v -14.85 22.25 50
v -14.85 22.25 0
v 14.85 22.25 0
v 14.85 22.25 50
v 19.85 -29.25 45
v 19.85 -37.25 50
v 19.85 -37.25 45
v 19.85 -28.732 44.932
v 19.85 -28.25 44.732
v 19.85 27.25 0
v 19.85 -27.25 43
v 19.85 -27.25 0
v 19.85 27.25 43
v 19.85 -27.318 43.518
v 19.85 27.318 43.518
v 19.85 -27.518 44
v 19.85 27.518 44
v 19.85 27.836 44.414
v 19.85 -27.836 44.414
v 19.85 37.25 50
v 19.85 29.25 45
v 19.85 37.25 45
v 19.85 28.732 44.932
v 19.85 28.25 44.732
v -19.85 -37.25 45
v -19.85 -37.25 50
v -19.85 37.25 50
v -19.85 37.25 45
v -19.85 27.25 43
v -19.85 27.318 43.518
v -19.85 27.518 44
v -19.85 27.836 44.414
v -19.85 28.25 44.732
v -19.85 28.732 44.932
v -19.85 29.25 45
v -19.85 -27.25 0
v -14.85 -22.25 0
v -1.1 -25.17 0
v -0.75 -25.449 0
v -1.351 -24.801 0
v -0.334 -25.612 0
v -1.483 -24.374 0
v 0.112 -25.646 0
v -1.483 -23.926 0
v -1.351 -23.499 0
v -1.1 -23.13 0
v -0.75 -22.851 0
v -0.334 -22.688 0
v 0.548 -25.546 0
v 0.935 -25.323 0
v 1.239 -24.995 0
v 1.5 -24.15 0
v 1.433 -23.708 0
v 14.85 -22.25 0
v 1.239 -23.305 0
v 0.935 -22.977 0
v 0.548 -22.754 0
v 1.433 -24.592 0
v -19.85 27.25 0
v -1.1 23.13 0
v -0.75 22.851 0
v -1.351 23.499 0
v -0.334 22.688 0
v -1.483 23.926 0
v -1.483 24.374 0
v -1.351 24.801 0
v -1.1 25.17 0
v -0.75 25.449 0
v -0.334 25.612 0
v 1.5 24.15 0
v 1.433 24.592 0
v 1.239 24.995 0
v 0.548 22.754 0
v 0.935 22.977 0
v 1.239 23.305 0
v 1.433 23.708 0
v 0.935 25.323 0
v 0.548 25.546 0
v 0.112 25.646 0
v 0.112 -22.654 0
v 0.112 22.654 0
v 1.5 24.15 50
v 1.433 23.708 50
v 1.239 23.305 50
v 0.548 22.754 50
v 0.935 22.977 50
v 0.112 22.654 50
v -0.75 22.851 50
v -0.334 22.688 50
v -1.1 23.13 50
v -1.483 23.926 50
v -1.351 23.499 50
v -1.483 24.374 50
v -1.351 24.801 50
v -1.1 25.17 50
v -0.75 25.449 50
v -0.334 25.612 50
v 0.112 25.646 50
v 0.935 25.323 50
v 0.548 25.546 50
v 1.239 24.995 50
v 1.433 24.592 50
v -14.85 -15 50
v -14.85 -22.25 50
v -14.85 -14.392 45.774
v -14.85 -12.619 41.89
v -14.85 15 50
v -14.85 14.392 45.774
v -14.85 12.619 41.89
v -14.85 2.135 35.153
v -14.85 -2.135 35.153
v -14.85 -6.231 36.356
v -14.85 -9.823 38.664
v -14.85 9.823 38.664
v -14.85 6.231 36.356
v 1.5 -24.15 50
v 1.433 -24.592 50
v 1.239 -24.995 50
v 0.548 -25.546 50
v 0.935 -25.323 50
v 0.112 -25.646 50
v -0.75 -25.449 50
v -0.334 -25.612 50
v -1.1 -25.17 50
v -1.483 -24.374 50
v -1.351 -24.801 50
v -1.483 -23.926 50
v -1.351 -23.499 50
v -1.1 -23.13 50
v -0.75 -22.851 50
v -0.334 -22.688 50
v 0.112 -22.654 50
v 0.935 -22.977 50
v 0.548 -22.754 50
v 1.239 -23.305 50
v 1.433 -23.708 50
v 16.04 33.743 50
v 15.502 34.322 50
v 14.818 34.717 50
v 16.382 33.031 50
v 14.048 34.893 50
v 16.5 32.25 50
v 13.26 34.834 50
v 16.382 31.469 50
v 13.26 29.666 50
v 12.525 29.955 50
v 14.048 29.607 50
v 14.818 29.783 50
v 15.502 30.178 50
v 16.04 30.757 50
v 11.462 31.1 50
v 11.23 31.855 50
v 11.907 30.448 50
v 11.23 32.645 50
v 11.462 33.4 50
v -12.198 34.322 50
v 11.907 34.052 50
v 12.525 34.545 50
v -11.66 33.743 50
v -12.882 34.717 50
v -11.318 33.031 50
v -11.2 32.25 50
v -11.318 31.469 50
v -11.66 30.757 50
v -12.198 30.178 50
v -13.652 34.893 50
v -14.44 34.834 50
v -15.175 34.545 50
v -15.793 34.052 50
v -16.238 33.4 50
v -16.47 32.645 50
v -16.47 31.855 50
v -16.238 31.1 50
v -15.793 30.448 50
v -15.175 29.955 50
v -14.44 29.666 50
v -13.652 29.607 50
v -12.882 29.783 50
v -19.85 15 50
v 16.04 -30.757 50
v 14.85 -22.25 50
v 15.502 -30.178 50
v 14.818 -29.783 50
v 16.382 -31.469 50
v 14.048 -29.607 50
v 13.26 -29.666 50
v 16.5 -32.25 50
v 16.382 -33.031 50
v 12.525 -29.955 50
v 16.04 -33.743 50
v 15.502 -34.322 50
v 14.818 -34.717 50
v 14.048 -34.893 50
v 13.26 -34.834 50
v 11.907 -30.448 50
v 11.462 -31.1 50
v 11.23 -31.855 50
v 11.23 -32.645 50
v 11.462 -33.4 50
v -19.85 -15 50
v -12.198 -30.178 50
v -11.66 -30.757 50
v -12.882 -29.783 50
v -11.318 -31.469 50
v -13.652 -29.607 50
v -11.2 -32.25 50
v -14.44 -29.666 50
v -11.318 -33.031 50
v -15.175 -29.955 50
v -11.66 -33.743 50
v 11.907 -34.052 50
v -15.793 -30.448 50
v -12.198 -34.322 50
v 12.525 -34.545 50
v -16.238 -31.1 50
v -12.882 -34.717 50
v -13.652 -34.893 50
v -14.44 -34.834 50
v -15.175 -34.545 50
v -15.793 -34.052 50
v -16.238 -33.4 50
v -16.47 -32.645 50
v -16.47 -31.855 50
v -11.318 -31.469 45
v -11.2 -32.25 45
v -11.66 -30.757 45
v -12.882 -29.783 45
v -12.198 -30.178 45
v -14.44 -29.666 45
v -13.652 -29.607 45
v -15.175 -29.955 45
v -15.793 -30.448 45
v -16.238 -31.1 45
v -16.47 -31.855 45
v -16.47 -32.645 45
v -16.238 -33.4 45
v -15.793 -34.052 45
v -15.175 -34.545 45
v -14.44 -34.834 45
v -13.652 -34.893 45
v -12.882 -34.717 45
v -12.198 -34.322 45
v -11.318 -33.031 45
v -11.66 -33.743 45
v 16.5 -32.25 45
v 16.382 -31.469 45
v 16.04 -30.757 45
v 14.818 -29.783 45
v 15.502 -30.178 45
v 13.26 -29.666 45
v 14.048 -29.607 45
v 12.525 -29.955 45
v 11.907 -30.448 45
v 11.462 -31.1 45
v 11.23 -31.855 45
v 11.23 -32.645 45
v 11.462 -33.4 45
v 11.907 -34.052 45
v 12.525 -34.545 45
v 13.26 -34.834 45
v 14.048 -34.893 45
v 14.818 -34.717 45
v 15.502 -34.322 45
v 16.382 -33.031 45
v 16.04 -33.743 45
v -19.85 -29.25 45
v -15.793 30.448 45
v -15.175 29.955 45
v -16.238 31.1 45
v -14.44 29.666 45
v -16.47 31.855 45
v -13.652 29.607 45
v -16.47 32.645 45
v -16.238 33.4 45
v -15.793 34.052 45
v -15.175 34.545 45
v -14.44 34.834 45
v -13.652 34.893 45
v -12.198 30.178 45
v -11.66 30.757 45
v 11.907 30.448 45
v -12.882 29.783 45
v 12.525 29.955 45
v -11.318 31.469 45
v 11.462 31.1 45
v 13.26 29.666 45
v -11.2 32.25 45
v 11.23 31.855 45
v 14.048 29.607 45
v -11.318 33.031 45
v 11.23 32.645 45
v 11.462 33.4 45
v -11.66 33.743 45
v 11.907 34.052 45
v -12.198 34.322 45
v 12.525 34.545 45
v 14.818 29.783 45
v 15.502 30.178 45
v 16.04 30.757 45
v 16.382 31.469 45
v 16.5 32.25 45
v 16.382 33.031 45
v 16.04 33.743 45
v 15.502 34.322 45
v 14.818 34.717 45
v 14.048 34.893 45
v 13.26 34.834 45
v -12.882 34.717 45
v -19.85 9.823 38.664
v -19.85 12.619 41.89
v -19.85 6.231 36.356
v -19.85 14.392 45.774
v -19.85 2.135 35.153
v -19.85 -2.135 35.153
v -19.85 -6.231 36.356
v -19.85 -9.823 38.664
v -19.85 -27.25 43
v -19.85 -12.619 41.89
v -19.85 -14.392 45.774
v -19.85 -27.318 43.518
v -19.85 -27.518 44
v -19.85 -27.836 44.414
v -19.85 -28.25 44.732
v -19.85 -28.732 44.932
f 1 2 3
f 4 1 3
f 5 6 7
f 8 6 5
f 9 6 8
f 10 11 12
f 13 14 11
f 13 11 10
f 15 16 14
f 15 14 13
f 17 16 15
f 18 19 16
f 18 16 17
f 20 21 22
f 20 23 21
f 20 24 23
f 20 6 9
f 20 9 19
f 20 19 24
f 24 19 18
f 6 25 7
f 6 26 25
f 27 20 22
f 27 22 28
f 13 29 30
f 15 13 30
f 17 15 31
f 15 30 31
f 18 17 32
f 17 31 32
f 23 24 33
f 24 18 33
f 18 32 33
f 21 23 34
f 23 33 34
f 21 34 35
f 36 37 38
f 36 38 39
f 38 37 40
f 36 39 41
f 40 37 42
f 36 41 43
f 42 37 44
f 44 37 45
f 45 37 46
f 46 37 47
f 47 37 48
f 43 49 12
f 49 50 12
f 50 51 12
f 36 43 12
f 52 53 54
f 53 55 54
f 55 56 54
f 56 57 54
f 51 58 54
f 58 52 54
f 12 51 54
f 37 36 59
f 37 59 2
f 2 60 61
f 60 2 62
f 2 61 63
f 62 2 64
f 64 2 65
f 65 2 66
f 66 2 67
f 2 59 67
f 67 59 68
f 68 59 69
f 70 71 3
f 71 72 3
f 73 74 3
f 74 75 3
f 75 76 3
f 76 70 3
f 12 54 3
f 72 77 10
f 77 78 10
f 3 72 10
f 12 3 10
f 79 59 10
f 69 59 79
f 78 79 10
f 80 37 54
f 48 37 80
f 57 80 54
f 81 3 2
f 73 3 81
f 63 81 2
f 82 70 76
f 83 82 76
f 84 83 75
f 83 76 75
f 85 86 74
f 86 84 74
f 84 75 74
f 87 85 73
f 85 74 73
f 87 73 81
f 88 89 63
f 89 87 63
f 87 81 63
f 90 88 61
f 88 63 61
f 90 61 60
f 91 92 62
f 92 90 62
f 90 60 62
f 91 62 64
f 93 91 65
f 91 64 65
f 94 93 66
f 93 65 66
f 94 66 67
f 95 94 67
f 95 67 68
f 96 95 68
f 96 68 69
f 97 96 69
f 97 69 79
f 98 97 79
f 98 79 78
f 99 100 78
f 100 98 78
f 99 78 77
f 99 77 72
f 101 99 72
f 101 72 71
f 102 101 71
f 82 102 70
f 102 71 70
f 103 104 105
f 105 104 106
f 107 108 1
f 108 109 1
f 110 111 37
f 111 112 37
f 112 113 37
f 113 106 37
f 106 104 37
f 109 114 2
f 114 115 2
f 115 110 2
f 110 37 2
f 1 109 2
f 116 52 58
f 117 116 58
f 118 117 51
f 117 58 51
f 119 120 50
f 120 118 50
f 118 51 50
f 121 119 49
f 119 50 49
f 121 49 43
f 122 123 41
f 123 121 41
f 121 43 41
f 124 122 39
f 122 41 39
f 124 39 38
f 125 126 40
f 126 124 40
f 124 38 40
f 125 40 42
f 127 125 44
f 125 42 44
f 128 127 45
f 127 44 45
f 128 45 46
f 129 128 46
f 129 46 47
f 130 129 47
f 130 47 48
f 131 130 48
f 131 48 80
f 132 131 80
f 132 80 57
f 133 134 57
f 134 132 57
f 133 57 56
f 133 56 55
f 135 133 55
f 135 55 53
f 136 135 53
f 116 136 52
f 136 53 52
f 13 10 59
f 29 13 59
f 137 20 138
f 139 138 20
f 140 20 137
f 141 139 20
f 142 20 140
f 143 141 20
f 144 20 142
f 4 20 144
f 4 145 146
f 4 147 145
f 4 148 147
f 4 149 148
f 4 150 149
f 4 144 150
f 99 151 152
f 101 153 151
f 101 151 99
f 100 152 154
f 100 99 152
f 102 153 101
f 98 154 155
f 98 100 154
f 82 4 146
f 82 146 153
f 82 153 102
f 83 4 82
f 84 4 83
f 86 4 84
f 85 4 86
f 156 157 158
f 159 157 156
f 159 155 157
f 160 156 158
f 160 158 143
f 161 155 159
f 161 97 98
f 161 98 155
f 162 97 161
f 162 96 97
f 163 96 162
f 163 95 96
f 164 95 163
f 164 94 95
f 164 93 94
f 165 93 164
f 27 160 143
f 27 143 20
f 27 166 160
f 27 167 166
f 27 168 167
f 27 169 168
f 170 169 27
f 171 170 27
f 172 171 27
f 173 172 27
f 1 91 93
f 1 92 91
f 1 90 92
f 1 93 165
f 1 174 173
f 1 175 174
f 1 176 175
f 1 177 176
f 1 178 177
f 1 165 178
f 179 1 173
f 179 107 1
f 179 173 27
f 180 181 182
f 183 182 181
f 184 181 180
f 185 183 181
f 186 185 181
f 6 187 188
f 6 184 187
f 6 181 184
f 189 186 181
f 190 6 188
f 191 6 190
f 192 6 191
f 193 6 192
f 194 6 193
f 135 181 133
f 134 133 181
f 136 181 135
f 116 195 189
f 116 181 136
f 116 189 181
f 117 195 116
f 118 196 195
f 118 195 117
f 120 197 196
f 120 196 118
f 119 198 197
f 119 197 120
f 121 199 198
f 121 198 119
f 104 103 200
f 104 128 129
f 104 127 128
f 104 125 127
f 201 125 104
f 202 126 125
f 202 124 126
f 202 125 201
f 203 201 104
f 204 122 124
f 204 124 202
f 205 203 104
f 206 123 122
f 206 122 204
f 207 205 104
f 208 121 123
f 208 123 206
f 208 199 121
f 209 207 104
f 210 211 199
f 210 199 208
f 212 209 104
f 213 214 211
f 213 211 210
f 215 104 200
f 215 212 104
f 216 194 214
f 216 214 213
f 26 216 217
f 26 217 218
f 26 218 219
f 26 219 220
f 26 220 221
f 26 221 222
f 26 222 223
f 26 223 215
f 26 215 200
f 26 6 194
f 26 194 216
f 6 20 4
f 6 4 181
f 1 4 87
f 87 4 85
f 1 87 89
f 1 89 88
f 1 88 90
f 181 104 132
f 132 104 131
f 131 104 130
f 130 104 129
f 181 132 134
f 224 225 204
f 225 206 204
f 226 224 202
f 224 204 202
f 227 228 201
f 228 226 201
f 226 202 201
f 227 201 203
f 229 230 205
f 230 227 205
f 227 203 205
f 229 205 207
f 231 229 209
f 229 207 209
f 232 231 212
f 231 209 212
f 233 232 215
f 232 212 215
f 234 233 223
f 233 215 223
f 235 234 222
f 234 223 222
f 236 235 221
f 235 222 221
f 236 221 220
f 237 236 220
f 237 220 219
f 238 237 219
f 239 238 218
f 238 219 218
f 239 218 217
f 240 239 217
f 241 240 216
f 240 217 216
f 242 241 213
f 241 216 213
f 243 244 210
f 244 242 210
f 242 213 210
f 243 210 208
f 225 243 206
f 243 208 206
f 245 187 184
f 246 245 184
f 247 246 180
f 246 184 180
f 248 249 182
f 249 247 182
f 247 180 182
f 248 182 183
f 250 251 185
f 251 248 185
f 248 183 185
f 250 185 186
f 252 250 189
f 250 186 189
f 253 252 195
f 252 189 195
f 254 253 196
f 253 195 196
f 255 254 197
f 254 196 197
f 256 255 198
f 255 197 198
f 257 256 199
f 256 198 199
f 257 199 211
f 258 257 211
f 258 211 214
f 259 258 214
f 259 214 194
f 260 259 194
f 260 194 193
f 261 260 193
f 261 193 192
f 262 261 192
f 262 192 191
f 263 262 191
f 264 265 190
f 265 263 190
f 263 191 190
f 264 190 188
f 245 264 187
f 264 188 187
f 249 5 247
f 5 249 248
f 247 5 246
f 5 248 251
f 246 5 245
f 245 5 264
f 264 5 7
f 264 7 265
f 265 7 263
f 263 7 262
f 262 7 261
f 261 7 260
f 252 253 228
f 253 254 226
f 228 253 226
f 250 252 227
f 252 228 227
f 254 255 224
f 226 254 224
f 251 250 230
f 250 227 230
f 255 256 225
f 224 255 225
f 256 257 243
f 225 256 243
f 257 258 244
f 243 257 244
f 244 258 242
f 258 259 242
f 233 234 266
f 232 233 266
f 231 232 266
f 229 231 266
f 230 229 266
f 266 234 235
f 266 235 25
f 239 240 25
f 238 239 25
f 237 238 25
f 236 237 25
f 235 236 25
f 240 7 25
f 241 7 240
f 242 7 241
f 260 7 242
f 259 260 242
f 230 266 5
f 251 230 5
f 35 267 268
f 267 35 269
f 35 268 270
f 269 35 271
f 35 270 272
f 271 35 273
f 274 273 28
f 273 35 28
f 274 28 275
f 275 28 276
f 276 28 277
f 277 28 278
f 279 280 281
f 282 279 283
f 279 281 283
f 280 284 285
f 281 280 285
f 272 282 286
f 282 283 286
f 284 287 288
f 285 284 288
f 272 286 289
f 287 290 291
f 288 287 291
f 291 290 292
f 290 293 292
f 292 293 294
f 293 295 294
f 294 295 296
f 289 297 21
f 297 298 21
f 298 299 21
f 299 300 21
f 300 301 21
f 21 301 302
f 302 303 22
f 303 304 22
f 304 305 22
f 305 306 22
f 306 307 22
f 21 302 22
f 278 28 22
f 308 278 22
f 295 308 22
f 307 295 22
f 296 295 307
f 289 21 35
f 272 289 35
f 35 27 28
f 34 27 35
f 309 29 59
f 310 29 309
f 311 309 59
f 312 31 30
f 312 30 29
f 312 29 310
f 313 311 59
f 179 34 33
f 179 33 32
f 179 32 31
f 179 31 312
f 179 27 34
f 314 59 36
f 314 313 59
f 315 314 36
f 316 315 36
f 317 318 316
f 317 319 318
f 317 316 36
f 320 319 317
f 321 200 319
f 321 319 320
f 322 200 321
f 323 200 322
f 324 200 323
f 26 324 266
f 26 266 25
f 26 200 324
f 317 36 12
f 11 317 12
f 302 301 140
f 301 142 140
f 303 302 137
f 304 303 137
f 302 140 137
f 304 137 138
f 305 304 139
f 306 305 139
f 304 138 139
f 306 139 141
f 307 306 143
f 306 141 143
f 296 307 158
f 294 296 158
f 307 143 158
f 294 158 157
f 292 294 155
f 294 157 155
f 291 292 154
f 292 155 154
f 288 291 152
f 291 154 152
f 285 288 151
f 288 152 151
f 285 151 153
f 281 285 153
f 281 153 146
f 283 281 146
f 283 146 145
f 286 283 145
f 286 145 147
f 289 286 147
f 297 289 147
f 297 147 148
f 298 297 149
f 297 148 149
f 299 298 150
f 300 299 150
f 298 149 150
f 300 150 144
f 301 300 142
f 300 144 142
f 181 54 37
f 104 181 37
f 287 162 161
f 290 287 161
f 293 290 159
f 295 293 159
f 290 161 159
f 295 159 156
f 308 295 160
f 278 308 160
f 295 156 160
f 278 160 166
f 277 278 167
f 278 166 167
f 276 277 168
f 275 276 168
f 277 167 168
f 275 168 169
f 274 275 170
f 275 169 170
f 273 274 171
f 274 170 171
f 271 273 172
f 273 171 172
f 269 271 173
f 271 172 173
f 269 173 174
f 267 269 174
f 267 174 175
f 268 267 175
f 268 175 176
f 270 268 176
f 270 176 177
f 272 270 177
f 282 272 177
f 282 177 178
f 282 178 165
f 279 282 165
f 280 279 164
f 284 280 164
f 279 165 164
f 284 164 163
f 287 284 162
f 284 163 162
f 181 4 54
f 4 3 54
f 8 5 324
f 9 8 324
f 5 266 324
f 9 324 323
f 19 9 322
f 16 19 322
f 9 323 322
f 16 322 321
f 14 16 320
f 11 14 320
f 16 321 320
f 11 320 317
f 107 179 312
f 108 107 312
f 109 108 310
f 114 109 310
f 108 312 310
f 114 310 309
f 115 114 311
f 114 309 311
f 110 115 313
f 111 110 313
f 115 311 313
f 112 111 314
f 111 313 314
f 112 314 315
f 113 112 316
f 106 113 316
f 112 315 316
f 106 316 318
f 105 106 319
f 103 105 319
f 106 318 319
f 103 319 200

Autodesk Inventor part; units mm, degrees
ref_plane "YZ Plane" through (0, 0, 0) normal (1, 0, 0) x (0, 1, 0)
ref_plane "XZ Plane" through (0, 0, 0) normal (0, 1, 0) x (-1, 0, 0)
ref_plane "XY Plane" through (0, 0, 0) normal (0, 0, 1) x (1, 0, 0)
ref_plane "Work Plane1" through (0, 0, 0) normal (0, 0, 1) x (1, 0, 0)
sketch "Sketch1" plane through (0, 0, 0) normal (0, 0, 1) x (1, 0, 0)
  circle A0 centre (0, 24.15) radius 1.6 construction
  circle A1 centre (0, -24.15) radius 1.6 construction
  line L0 (-19.85, -7.6776) -> (-19.85, 7.6776) construction
  arc A2 (-19.85, -7.6776) -> (-19.2715, -9.0845) centre (-17.85, -7.6776) ccw construction
  line L1 (-2.2034, -26.3306) -> (-19.2715, -9.0845) construction
  arc A3 (-2.2034, -26.3306) -> (2.2034, -26.3306) centre (0, -24.15) ccw construction
  line L2 (19.2715, -9.0845) -> (2.2034, -26.3306) construction
  arc A4 (19.2715, -9.0845) -> (19.85, -7.6776) centre (17.85, -7.6776) ccw construction
  line L3 (19.85, 7.6776) -> (19.85, -7.6776) construction
  arc A5 (19.85, 7.6776) -> (19.2715, 9.0845) centre (17.85, 7.6776) ccw construction
  line L4 (2.2034, 26.3306) -> (19.2715, 9.0845) construction
  arc A6 (2.2034, 26.3306) -> (-2.2034, 26.3306) centre (0, 24.15) ccw construction
  line L5 (-19.2715, 9.0845) -> (-2.2034, 26.3306) construction
  arc A7 (-19.2715, 9.0845) -> (-19.85, 7.6776) centre (-17.85, 7.6776) ccw construction
  circle A8 centre (0, 0) radius 13.8 construction
  circle A9 centre (0, 0) radius 14.3 construction
  line L6 (-19.85, -27.25) -> (19.85, -27.25)
  line L7 (19.85, -27.25) -> (19.85, 27.25)
  line L8 (19.85, 27.25) -> (-19.85, 27.25)
  line L9 (-19.85, 27.25) -> (-19.85, -27.25)
  circle A10 centre (0, -24.15) radius 1.5
  circle A11 centre (0, 24.15) radius 1.5
  line L10 (14.85, 22.25) -> (14.85, -22.25)
  line L11 (14.85, -22.25) -> (-14.85, -22.25)
  line L12 (-14.85, -22.25) -> (-14.85, 22.25)
  line L13 (-14.85, 22.25) -> (14.85, 22.25)
  dimension "d0" = 0.5
  dimension "d2" = 3
  dimension "d3" = 3
  dimension "d4" = 5
extrude "Extrusion1" add sketch "Sketch1" along normal blind 50
sketch "Sketch2" plane through (-19.85, -27.25, 0) normal (-1, 0, 0) x (0, 0, 1)
  line L0 (50, 54.5) -> (50, 0) projected
  line L1 (50, 0) -> (50, 54.5) projected
  circle A0 centre (50, 27.25) radius 15
  point P0 (0, 27.25)
  point P1 (50, 12.25)
  point P2 (50, 42.25)
  dimension "d7" = 30
extrude "Extrusion2" cut sketch "Sketch2" against normal up to surface (34.7 mm away) contours L0 A0 picked at (45.0365, 27.8527)
sketch "Sketch3" plane through (0, 0, 50) normal (0, 0, 1) x (1, 0, 0)
  line L0 (19.85, 27.25) -> (-19.85, 27.25) projected
  line L1 (-19.85, 27.25) -> (19.85, 27.25)
  line L2 (19.85, 27.25) -> (19.85, 37.25)
  line L3 (19.85, 37.25) -> (-19.85, 37.25)
  line L4 (-19.85, 37.25) -> (-19.85, 27.25)
  line L5 (19.85, -27.25) -> (19.85, 27.25) projected
  circle A0 centre (-13.85, 32.25) radius 2.65
  circle A1 centre (13.85, 32.25) radius 2.65
  line L6 (0, 37.25) -> (0, 27.25) construction
  point P0 (0, 0)
  point P1 (-19.85, 32.25)
  dimension "d10" = 5.3
  dimension "d12" = 6
  dimension "d13" = 10
extrude "Extrusion3" add sketch "Sketch3" against normal blind 5
fillet "Fillet1" radius 2 1 edges at (0, 27.25, 45)
ref_plane "Work Plane2" through (-19.85, 0, 0) normal (0, 1, 0) x (1, 0, 0)
mirror "Mirror1" about plane through (-19.85, 0, 0) normal (0, 1, 0) of "Extrusion3", "Fillet1"
properties part number "peristaltic pump bracket"
